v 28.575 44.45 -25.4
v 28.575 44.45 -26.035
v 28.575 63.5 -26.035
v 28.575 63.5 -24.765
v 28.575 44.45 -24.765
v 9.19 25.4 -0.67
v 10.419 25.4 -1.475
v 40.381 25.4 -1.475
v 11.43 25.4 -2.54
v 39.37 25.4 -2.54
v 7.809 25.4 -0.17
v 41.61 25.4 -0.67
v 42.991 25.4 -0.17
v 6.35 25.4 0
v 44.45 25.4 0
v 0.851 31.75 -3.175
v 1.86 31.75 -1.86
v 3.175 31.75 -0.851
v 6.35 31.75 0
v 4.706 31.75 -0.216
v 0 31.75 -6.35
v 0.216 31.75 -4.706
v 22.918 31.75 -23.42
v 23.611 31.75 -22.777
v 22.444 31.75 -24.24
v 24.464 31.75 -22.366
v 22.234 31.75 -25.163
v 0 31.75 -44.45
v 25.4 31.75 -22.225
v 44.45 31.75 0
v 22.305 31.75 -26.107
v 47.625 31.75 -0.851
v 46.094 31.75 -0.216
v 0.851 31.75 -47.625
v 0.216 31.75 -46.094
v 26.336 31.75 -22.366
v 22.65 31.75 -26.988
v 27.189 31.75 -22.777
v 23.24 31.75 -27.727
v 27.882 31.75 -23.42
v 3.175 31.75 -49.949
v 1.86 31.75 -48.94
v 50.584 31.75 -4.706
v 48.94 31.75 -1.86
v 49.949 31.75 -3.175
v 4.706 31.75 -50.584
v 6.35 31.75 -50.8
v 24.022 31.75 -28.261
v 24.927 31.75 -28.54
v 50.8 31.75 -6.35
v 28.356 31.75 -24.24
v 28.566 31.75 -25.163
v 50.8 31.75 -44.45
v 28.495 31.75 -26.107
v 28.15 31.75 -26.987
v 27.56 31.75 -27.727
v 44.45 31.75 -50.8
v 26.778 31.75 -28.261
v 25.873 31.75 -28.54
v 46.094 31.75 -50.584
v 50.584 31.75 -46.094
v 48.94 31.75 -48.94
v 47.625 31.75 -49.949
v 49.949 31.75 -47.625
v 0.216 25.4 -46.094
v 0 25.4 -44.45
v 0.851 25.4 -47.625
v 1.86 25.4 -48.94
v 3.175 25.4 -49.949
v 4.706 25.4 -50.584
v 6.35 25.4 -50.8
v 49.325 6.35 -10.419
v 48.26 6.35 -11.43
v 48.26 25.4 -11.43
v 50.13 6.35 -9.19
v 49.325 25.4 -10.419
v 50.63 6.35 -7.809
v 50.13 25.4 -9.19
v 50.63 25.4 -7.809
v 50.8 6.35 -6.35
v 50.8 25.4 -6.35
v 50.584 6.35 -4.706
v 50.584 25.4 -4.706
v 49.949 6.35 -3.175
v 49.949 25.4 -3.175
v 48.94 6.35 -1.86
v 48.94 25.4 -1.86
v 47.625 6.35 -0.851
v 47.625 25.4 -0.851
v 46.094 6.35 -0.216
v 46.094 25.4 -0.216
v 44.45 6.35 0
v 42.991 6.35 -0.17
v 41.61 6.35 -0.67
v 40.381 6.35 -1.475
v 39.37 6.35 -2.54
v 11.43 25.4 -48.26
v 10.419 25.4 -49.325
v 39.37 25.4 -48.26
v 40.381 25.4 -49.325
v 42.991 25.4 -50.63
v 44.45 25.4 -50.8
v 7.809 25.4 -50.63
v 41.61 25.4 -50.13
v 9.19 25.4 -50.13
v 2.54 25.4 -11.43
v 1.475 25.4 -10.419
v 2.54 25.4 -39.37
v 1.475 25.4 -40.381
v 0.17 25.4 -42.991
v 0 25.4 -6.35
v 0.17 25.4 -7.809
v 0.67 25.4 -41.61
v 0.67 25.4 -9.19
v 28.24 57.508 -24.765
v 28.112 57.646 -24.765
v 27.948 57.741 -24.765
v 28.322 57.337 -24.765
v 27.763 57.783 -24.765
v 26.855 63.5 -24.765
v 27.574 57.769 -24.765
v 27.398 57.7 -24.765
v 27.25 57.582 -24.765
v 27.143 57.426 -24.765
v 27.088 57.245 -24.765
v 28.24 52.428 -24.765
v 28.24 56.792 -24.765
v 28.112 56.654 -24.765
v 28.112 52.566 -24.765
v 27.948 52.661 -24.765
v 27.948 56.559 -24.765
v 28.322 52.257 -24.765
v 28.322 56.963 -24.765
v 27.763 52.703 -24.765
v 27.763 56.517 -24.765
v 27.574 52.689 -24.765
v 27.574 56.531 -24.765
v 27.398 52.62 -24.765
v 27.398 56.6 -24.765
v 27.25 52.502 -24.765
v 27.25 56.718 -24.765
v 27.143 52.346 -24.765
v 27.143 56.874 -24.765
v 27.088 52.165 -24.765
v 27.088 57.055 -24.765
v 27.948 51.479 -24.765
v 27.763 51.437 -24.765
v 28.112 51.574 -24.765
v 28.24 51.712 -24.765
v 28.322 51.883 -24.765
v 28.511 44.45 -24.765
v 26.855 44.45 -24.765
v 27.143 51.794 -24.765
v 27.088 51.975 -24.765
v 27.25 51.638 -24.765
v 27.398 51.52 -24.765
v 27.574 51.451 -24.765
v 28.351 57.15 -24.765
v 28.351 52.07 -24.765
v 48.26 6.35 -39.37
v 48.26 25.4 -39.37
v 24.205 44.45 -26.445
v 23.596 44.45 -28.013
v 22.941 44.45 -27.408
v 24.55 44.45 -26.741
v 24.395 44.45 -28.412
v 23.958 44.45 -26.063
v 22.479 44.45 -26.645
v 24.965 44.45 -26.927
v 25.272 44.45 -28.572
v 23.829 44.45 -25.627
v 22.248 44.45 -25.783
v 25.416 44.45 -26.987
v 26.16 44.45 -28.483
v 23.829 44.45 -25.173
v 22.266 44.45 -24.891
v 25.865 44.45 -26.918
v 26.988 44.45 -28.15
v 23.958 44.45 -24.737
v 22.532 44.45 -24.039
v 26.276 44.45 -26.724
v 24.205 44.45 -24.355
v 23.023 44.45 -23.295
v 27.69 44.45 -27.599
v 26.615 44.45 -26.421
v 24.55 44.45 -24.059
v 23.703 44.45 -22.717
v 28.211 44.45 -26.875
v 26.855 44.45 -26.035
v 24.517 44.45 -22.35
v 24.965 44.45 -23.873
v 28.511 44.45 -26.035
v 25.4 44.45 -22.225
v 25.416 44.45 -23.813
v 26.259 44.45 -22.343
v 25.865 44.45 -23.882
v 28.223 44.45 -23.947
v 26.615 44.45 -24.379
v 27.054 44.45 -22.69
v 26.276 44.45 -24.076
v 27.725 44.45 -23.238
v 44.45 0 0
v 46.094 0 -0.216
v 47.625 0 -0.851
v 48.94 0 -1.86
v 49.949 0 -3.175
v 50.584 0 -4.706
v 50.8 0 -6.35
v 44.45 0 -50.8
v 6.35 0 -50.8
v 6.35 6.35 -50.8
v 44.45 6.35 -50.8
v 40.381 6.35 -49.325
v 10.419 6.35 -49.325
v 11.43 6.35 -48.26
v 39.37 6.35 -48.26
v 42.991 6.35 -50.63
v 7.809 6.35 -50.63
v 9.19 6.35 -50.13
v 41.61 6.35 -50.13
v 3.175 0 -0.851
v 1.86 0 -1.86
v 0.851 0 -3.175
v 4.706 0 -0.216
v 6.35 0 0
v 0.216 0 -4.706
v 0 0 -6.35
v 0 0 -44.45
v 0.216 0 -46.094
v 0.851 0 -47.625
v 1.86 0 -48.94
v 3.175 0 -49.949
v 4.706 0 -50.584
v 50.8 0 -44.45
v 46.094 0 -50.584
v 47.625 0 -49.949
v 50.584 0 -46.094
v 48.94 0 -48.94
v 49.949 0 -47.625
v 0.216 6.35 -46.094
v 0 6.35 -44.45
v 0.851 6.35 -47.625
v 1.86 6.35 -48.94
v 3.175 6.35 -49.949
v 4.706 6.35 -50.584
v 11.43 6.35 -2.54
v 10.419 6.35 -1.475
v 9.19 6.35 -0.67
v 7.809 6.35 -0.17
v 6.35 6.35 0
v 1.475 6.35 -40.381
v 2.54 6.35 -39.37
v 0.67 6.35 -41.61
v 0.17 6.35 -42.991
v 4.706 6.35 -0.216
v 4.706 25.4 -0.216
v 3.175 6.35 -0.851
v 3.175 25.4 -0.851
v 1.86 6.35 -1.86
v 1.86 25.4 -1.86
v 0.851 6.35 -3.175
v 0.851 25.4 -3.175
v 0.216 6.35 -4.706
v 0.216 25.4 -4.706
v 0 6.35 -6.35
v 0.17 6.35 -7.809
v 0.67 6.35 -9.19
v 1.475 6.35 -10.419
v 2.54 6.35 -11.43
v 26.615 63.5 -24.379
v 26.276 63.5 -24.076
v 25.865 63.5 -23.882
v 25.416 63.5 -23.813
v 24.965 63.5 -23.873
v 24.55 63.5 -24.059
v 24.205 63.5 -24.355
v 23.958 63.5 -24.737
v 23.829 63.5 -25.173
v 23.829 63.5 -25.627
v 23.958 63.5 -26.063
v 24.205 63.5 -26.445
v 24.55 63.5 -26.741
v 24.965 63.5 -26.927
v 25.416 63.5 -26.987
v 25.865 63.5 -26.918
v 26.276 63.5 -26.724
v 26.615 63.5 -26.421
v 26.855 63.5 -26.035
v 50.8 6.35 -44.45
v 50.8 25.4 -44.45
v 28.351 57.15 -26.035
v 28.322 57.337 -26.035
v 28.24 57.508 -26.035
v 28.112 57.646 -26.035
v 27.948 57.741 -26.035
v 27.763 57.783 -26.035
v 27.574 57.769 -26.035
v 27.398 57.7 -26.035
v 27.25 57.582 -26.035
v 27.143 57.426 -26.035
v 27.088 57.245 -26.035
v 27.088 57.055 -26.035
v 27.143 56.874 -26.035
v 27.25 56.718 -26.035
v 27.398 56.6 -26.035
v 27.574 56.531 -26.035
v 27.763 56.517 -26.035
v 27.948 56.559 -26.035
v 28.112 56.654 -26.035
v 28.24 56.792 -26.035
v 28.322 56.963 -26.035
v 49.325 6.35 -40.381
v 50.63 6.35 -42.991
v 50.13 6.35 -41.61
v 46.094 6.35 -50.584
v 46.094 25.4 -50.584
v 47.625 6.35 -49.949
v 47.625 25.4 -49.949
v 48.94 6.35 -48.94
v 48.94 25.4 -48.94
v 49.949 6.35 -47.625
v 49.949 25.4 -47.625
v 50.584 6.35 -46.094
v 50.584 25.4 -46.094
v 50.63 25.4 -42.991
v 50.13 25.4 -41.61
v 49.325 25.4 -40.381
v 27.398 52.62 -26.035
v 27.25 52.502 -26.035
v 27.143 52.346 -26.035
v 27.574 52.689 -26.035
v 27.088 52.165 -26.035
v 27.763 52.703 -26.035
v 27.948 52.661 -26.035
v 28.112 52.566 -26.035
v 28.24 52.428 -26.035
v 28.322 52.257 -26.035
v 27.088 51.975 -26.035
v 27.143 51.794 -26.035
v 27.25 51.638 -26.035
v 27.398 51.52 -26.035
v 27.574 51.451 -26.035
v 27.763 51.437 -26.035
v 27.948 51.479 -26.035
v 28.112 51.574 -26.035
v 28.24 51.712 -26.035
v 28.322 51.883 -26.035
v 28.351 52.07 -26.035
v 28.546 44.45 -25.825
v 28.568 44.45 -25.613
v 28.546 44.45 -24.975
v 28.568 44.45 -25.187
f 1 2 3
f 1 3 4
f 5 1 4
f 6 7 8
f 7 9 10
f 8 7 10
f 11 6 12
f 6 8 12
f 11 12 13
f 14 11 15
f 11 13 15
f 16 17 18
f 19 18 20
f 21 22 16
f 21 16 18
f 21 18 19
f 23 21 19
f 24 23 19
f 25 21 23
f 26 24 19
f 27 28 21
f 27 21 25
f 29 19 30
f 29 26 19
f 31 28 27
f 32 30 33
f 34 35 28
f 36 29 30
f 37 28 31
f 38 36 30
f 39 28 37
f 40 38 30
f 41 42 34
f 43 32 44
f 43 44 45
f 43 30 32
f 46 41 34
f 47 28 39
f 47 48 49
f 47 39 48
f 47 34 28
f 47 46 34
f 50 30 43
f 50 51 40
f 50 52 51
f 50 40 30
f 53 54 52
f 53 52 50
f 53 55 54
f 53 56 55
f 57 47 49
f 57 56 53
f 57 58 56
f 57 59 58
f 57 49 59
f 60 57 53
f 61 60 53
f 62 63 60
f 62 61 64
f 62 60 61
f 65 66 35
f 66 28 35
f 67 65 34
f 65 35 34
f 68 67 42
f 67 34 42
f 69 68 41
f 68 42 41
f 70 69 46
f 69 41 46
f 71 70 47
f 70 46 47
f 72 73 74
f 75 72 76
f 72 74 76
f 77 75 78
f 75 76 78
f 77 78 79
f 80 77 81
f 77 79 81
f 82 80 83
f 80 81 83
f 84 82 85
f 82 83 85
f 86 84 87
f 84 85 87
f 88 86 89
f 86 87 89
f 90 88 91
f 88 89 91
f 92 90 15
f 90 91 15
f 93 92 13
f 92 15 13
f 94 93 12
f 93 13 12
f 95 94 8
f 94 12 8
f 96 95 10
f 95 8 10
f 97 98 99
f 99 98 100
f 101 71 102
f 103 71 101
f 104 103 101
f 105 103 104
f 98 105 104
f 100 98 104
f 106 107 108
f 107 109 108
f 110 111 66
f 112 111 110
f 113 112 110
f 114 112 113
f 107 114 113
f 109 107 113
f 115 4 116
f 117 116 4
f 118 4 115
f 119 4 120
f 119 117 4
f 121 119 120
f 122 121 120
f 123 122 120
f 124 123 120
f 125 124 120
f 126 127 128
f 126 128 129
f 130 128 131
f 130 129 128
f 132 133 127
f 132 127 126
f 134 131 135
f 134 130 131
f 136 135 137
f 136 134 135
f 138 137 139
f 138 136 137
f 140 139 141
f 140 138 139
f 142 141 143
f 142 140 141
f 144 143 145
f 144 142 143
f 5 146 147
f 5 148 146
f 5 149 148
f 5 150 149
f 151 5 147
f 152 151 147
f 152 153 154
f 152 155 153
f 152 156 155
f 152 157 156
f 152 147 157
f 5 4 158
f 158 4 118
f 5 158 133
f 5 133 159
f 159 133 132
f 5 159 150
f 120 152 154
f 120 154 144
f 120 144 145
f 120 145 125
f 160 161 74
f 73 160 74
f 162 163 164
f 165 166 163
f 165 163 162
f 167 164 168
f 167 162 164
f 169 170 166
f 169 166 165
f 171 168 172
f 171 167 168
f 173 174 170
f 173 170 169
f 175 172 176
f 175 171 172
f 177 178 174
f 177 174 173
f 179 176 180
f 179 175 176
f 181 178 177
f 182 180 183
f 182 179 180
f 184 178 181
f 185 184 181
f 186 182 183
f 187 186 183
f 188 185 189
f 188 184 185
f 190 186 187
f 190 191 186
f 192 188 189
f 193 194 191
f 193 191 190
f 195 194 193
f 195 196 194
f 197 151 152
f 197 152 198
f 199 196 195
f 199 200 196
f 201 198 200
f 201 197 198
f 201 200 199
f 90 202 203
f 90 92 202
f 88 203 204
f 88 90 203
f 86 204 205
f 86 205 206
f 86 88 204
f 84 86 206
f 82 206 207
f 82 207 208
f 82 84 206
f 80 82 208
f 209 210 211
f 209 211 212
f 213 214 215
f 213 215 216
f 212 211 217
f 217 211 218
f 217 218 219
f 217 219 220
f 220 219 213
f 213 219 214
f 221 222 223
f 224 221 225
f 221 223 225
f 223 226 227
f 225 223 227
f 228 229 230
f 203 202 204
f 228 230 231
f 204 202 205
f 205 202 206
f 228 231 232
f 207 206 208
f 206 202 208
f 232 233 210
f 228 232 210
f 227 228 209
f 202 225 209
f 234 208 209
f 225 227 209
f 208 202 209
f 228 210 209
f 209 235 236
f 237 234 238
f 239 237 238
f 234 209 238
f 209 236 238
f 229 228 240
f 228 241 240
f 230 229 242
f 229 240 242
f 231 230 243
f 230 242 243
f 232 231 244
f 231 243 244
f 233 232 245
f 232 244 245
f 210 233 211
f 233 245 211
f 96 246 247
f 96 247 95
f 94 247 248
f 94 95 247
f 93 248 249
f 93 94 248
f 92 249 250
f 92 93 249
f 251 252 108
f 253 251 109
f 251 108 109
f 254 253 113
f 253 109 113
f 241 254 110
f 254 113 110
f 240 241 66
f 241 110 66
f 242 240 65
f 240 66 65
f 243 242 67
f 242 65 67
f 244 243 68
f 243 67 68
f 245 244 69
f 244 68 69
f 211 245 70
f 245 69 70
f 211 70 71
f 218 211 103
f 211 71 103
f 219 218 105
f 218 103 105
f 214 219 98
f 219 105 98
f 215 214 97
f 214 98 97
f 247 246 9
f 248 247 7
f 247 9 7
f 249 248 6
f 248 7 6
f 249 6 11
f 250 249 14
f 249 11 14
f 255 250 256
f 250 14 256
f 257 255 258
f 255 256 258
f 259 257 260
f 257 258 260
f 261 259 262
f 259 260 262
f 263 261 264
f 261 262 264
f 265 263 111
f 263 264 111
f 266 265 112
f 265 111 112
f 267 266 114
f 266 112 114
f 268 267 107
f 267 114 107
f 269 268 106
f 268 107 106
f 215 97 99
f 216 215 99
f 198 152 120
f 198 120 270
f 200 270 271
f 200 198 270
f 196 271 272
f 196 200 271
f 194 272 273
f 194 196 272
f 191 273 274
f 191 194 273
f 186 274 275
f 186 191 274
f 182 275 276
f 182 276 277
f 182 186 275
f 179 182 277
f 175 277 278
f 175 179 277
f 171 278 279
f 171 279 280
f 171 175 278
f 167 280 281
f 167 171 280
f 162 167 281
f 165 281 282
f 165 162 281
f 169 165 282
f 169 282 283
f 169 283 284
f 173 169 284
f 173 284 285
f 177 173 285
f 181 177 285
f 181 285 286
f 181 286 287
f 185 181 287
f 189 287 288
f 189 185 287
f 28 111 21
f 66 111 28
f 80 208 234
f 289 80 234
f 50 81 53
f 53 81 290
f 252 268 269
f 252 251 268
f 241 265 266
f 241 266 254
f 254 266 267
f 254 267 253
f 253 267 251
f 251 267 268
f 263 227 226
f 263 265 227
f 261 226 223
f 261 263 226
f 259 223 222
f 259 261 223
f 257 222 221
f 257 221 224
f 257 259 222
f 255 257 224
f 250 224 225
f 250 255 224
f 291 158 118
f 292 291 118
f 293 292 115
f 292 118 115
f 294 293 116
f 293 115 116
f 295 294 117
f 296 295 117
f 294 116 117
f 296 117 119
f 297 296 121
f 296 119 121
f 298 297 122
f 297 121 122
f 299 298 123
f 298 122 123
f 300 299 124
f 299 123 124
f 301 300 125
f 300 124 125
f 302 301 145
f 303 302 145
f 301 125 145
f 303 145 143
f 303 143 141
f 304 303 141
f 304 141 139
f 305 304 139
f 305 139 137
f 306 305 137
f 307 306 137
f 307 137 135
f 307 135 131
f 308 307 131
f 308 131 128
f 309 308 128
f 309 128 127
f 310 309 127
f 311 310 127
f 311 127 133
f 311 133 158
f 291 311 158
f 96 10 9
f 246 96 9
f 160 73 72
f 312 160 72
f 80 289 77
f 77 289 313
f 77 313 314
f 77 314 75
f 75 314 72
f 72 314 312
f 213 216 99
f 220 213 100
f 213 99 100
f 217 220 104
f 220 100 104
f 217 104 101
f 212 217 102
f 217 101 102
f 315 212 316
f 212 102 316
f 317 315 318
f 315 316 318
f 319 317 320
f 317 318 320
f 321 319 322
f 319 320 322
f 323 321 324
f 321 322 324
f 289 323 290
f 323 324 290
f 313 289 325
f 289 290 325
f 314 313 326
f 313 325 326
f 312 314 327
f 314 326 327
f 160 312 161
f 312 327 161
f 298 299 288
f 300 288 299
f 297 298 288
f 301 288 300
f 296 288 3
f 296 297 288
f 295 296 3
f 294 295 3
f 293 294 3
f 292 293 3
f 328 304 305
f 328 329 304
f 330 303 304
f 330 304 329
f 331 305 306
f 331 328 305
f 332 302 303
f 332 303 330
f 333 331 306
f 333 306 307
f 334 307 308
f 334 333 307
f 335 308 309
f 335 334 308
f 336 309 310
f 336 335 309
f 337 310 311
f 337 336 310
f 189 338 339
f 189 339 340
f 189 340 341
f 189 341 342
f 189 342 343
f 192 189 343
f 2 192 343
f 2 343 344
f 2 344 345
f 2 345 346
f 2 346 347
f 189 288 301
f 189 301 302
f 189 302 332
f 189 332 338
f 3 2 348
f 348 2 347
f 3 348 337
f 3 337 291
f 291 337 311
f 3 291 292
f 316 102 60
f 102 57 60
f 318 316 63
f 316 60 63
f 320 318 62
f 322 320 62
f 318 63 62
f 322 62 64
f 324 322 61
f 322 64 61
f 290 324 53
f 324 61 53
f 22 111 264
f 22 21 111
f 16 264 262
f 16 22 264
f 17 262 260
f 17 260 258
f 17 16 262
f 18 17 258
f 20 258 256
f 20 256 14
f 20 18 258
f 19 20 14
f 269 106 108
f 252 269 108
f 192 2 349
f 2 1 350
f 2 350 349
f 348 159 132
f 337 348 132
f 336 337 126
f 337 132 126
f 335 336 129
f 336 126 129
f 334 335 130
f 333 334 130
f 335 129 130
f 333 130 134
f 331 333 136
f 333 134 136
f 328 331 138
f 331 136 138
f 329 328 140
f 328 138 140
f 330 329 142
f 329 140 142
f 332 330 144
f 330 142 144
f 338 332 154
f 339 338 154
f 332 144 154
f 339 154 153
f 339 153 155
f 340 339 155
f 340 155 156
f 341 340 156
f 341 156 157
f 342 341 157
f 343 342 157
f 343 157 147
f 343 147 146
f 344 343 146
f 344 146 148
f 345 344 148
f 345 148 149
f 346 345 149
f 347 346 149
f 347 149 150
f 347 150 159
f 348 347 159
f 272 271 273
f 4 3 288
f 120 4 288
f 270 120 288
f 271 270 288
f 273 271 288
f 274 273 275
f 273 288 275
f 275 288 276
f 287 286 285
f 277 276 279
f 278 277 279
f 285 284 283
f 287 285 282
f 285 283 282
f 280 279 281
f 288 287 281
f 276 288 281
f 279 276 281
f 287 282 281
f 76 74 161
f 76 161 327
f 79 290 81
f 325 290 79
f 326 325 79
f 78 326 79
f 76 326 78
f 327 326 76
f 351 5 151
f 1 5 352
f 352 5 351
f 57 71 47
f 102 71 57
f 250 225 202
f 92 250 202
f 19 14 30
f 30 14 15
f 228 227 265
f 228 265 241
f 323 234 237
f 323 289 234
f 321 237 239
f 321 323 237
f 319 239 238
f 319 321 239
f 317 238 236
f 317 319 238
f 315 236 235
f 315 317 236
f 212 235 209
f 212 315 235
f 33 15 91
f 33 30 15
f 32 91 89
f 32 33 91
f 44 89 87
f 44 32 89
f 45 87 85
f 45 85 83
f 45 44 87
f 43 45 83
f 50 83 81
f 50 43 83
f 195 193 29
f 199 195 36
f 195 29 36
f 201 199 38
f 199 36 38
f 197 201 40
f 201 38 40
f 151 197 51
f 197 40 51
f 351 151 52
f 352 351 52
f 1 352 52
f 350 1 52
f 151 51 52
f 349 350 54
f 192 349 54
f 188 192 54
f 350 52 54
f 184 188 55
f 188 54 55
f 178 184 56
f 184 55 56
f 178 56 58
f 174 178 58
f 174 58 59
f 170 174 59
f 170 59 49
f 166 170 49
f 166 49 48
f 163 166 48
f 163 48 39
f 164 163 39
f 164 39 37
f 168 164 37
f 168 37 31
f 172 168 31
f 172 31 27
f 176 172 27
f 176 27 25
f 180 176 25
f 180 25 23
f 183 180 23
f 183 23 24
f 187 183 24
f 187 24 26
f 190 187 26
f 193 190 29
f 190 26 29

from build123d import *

# Parameters (mm, degrees)
SKETCH1_W           = 50.8
SKETCH1_H           = 50.8
BOSS_EXTRUDE1_DEPTH = 6.35
FILLET1_R           = 6.35
BOSS_EXTRUDE2_START = 19.05
BOSS_EXTRUDE2_DEPTH = 19.05
SKETCH5_W           = 50.8
SKETCH5_H           = 50.8
BOSS_EXTRUDE3_DEPTH = 6.35
FILLET2_R           = 6.35
SKETCH6_R           = 3.175
BOSS_EXTRUDE4_DEPTH = 12.7
BOSS_EXTRUDE5_DEPTH = 19.05
SKETCH8_R           = 0.635
CUT_EXTRUDE2_DEPTH  = 2.54


with BuildPart() as part:
    # Sketch1 → Boss-Extrude1 (new body)
    with BuildSketch(Plane(origin=(0, 0, 0), x_dir=(1, 0, 0), z_dir=(0, 1, 0))):
        with Locations((25.4, 25.4)):
            Rectangle(SKETCH1_W, SKETCH1_H)
    extrude(amount=BOSS_EXTRUDE1_DEPTH)

    # Fillet1
    fillet1_edges = [part.edges().sort_by_distance(p)[0] for p in [
        (0, 3.175, -50.8),
        (50.8, 3.175, -50.8),
        (50.8, 3.175, 0),
        (0, 3.175, 0),
    ]]
    fillet(fillet1_edges, radius=FILLET1_R)

    # Sketch3 → Boss-Extrude2 (add)
    with BuildSketch(Plane(origin=(0, 6.35, 0), x_dir=(1, 0, 0), z_dir=(0, 1, 0)).offset(BOSS_EXTRUDE2_START)):
        with BuildLine():
            Line((11.43, 48.26), (39.37, 48.26))
            ThreePointArc((39.37, 48.26), (48.940128061, 48.940128061), (48.26, 39.37))
            Line((48.26, 39.37), (48.26, 11.43))
            ThreePointArc((48.26, 11.43), (48.940128061, 1.859871939), (39.37, 2.54))
            Line((39.37, 2.54), (11.43, 2.54))
            ThreePointArc((11.43, 2.54), (1.859871939, 1.859871939), (2.54, 11.43))
            Line((2.54, 11.43), (2.54, 39.37))
            ThreePointArc((2.54, 39.37), (1.859871939, 48.940128061), (11.43, 48.26))
        make_face()
    extrude(amount=-BOSS_EXTRUDE2_DEPTH)

    # Sketch5 → Boss-Extrude3 (add)
    with BuildSketch(Plane(origin=(0, 25.4, 0), x_dir=(1, 0, 0), z_dir=(0, 1, 0))):
        with Locations((25.4, 25.4)):
            Rectangle(SKETCH5_W, SKETCH5_H)
    extrude(amount=BOSS_EXTRUDE3_DEPTH)

    # Fillet2
    fillet2_edges = [part.edges().sort_by_distance(p)[0] for p in [
        (50.8, 28.575, -50.8),
        (0, 28.575, -50.8),
        (50.8, 28.575, 0),
        (0, 28.575, 0),
    ]]
    fillet(fillet2_edges, radius=FILLET2_R - 0.0001)  # a hair under: the kernel refuses the full size

    # Sketch6 → Boss-Extrude4 (add)
    with BuildSketch(Plane(origin=(0, 31.75, 0), x_dir=(1, 0, 0), z_dir=(0, 1, 0))):
        with Locations(Location((25.4, 25.4, 0), (0, 0, 270))):
            Circle(SKETCH6_R)
    extrude(amount=BOSS_EXTRUDE4_DEPTH)

    # Sketch7 → Boss-Extrude5 (add)
    with BuildSketch(Plane(origin=(0, 44.45, 0), x_dir=(1, 0, 0), z_dir=(0, 1, 0))):
        with BuildLine():
            Line((28.575, 26.035), (28.575, 24.765))
            Line((28.575, 24.765), (26.854967783, 24.765))
            ThreePointArc((26.854967783, 24.765), (23.8125, 25.4), (26.854967783, 26.035))
            Line((26.854967783, 26.035), (28.575, 26.035))
        make_face()
    extrude(amount=BOSS_EXTRUDE5_DEPTH)

    # Sketch8 → Cut-Extrude2 (cut)
    with BuildSketch(Plane.XY.offset(-24.765)):
        with Locations((27.715591, 52.07)):
            Circle(SKETCH8_R)
        with Locations((27.715591, 57.15)):
            Circle(SKETCH8_R)
    extrude(amount=-CUT_EXTRUDE2_DEPTH, mode=Mode.SUBTRACT)


solid = part.part
